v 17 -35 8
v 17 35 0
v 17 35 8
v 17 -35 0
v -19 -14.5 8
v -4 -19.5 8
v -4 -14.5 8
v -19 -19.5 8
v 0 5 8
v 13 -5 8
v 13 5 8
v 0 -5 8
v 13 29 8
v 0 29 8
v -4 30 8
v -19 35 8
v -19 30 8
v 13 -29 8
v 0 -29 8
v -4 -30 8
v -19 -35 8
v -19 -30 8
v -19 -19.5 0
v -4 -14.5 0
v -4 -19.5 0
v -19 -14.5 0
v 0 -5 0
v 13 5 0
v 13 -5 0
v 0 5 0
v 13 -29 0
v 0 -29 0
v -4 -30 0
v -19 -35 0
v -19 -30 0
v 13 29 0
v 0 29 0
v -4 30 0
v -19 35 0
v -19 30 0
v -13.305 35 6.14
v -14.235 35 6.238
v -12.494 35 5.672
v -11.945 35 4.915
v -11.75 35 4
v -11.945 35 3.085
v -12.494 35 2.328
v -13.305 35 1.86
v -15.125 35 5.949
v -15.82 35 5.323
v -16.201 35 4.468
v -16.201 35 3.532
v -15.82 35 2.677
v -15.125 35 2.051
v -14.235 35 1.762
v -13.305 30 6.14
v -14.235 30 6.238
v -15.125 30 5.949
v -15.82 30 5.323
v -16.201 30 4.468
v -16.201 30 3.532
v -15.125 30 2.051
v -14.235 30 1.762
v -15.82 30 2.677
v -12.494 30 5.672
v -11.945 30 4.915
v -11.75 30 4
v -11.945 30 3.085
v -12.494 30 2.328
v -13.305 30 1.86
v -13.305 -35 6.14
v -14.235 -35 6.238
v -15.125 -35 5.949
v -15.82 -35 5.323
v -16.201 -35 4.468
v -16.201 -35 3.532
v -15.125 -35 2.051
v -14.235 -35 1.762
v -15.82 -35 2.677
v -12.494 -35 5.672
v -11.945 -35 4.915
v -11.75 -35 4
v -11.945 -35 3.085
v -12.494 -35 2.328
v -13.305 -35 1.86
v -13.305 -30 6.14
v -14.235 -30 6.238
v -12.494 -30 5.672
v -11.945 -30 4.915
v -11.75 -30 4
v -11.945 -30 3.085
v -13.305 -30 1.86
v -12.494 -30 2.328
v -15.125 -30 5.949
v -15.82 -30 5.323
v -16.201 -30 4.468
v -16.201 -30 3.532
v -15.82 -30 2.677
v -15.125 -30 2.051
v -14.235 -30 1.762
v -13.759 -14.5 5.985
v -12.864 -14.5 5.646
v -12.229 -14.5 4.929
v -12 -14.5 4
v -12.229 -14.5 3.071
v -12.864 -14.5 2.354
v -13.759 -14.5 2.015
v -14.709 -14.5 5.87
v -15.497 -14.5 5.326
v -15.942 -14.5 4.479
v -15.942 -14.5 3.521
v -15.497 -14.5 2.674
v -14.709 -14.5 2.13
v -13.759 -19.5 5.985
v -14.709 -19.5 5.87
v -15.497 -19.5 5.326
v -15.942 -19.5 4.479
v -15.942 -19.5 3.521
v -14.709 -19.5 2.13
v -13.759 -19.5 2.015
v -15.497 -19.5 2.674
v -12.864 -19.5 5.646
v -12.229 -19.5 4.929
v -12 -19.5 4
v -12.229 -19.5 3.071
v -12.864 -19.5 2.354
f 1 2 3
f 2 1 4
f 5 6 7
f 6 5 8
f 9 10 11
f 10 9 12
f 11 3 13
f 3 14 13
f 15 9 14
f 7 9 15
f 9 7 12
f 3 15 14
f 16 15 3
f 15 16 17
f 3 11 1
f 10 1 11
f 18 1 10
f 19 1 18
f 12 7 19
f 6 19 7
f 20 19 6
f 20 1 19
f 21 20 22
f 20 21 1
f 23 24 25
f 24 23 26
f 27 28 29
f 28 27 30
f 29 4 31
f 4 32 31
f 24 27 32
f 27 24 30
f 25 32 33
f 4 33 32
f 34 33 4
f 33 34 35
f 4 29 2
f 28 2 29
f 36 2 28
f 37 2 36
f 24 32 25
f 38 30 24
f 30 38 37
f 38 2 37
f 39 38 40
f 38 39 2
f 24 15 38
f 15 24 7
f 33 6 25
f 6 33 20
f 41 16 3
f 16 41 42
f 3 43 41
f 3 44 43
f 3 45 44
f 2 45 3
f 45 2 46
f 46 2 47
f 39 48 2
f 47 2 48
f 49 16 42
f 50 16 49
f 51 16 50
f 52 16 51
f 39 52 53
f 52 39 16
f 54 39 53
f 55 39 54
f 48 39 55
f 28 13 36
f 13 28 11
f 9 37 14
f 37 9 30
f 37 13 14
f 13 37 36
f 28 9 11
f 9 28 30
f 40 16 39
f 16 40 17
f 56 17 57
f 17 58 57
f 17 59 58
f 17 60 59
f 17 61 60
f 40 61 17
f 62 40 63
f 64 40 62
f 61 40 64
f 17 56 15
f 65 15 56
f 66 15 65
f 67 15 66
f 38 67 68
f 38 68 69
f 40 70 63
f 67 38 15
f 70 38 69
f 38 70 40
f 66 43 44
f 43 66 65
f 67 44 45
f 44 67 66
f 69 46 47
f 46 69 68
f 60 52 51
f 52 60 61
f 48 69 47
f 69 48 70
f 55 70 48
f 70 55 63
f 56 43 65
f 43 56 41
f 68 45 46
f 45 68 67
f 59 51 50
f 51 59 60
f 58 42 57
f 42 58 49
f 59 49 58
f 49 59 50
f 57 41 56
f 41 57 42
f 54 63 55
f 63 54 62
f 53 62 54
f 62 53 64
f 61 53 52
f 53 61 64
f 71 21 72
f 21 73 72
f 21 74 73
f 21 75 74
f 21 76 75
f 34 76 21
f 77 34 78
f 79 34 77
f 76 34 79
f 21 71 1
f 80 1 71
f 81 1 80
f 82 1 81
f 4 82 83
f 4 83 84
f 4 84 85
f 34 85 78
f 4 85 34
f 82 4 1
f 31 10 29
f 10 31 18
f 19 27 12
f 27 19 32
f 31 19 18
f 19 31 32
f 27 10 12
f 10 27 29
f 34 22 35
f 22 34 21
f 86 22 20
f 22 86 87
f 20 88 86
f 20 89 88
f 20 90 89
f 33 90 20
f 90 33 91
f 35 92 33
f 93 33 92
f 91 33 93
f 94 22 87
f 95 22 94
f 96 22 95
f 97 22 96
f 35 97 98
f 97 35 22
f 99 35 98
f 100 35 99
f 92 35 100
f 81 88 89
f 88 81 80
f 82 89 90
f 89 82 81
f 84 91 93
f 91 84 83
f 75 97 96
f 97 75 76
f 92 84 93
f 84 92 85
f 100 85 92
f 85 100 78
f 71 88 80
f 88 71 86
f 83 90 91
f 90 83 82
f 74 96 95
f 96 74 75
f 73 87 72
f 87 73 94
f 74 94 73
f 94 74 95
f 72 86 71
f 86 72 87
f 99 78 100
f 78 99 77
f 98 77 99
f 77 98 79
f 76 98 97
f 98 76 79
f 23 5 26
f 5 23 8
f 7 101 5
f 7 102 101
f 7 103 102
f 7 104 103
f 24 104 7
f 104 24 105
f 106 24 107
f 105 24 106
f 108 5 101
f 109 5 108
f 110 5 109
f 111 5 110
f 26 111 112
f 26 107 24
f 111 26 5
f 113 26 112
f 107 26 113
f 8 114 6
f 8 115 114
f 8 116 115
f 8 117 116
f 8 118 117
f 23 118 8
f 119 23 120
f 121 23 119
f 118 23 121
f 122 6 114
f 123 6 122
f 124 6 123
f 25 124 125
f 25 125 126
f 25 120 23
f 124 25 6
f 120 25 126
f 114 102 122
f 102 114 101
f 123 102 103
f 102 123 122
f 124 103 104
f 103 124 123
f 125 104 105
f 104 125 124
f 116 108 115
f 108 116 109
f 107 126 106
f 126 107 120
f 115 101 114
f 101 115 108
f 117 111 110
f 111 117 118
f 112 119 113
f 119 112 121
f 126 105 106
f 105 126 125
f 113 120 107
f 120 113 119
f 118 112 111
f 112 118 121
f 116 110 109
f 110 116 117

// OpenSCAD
$fs=1;
$fa=1;

servo_l = 24;
servo_w = 13;
servo_h = 21;

bolt_hole_diameter = 4.5;
servo_axis_diameter = 4;

magnet_hole_l = 10.5;
magnet_hole_w = 6.5;
magnet_hole_d = 2;
magnet_hole_margin = 2;

base_l = servo_l * 2 + 24;
base_w = 44;
base_h = 3;

base_joint_space = 0.7;
base_joint_height = 26;

arm_h = 5;
arm_w = 5;
arm_l = 50;

pen_diameter = 13;

eraser_magnet_diameter = 25.5;

module servoholder(h = 8) {
	module bolt_bracket(d) {
		r=d/2;
		translate([-14,0,h/2])
		difference() {
			translate([4,0]) cube([18,5,h], center=true);
			rotate(a=90,v=[1,0,0]) cylinder(r=r, h=20, center=true);
		}
	}
	translate([0,0,-h/2]) {
		for (i = [0,1]) mirror([0,i,0]) {
			translate([0,5,0])
			difference() {
				translate([-4, -6]) cube([servo_w + 8, servo_l + 12, h]);
				translate([0,0,-1]) cube([servo_w, servo_l, h + 2]);
			}
			translate([0,5/2 + servo_l + 6,0]) bolt_bracket(bolt_hole_diameter);
		}
		translate([0,-17,0]) bolt_bracket(servo_axis_diameter);
	}
}

module base() {
	difference() {
		translate([-base_w/2,-base_l/2]) cube([base_w,base_l,base_h]);
		for (i = [0,1]) mirror([i,0,0])
		for (j = [0,1]) mirror([0,j,0]) {
			translate([
				base_w/2 - magnet_hole_w - magnet_hole_margin,
				base_l/2 - magnet_hole_l - magnet_hole_margin,
				base_h - magnet_hole_d
			])
			cube([magnet_hole_w,magnet_hole_l,magnet_hole_d+1]);
		}
	}
	difference() {
		for (i = [0, 1]) mirror([0,i,0]) {
			translate([-servo_w/2 - 4, 0, 0]) cube([servo_w + 8, servo_l + 6 - base_joint_space, 15]);
			translate([0, servo_l + 6 - base_joint_space , 0])
			difference() {
				translate([-5, -5, 0]) cube([10, 5, base_joint_height + 4]);
				translate([0,1,base_joint_height]) rotate(a=90, v=[1,0,0]) cylinder(r=bolt_hole_diameter/2, h=10);
			}
		}
		translate([-servo_w/2,-servo_h/2,8]) {
			cube([servo_w,servo_h,servo_l]);
			translate([0,3.5,-4]) cube([12,3,6]);
		}
	}
}

module arm_ring(d) {
	do = d + arm_w;
	difference() {
		cylinder(h=arm_h, r=do/2);
		translate([0,0,-1]) cylinder(h=arm_h+2, r=d/2);
	}
}

module arm(hole1, hole2) {
	arm_ring(hole1);
	translate([hole1/2,-arm_w/2,0]) cube([arm_l-hole1/2-hole2/2,arm_w,arm_h]);
	translate([arm_l,0,0]) arm_ring(hole2);
}

module pen_arm() {
	arm(bolt_hole_diameter, bolt_hole_diameter);
	rotate(a=45,v=[0,0,1])
	translate([-arm_w/2-pen_diameter/2-bolt_hole_diameter/2,0])
	difference() {
		arm_ring(pen_diameter, pen_diameter + arm_w);
		translate([-pen_diameter/2,0,-1]) cylinder(r=pen_diameter/2,h=arm_h+2);
	}
}

module eraser() {
	module ring(di,do,h) {
		difference() {
			cylinder(h=h, r=do/2);
			translate([0,0,-1]) cylinder(h=h+2, r=di/2);
		}
	}
	ring(10, eraser_magnet_diameter + 1, 5);
	ring(eraser_magnet_diameter, eraser_magnet_diameter + 2.5, 8);
}

//color("yellow") translate([-50,0,0]) base();
color("red") translate([0,0,4]) servoholder();
//color("green") translate([40, 30, 0]) arm(servo_axis_diameter, bolt_hole_diameter);
//color("green") translate([40, 10, 0]) arm(servo_axis_diameter, bolt_hole_diameter);
//color("green") translate([40, -10, 0]) arm(bolt_hole_diameter, bolt_hole_diameter);
//color("green") translate([40, -30, 0]) pen_arm();
//color("blue") translate([60, 60, 0]) eraser();
